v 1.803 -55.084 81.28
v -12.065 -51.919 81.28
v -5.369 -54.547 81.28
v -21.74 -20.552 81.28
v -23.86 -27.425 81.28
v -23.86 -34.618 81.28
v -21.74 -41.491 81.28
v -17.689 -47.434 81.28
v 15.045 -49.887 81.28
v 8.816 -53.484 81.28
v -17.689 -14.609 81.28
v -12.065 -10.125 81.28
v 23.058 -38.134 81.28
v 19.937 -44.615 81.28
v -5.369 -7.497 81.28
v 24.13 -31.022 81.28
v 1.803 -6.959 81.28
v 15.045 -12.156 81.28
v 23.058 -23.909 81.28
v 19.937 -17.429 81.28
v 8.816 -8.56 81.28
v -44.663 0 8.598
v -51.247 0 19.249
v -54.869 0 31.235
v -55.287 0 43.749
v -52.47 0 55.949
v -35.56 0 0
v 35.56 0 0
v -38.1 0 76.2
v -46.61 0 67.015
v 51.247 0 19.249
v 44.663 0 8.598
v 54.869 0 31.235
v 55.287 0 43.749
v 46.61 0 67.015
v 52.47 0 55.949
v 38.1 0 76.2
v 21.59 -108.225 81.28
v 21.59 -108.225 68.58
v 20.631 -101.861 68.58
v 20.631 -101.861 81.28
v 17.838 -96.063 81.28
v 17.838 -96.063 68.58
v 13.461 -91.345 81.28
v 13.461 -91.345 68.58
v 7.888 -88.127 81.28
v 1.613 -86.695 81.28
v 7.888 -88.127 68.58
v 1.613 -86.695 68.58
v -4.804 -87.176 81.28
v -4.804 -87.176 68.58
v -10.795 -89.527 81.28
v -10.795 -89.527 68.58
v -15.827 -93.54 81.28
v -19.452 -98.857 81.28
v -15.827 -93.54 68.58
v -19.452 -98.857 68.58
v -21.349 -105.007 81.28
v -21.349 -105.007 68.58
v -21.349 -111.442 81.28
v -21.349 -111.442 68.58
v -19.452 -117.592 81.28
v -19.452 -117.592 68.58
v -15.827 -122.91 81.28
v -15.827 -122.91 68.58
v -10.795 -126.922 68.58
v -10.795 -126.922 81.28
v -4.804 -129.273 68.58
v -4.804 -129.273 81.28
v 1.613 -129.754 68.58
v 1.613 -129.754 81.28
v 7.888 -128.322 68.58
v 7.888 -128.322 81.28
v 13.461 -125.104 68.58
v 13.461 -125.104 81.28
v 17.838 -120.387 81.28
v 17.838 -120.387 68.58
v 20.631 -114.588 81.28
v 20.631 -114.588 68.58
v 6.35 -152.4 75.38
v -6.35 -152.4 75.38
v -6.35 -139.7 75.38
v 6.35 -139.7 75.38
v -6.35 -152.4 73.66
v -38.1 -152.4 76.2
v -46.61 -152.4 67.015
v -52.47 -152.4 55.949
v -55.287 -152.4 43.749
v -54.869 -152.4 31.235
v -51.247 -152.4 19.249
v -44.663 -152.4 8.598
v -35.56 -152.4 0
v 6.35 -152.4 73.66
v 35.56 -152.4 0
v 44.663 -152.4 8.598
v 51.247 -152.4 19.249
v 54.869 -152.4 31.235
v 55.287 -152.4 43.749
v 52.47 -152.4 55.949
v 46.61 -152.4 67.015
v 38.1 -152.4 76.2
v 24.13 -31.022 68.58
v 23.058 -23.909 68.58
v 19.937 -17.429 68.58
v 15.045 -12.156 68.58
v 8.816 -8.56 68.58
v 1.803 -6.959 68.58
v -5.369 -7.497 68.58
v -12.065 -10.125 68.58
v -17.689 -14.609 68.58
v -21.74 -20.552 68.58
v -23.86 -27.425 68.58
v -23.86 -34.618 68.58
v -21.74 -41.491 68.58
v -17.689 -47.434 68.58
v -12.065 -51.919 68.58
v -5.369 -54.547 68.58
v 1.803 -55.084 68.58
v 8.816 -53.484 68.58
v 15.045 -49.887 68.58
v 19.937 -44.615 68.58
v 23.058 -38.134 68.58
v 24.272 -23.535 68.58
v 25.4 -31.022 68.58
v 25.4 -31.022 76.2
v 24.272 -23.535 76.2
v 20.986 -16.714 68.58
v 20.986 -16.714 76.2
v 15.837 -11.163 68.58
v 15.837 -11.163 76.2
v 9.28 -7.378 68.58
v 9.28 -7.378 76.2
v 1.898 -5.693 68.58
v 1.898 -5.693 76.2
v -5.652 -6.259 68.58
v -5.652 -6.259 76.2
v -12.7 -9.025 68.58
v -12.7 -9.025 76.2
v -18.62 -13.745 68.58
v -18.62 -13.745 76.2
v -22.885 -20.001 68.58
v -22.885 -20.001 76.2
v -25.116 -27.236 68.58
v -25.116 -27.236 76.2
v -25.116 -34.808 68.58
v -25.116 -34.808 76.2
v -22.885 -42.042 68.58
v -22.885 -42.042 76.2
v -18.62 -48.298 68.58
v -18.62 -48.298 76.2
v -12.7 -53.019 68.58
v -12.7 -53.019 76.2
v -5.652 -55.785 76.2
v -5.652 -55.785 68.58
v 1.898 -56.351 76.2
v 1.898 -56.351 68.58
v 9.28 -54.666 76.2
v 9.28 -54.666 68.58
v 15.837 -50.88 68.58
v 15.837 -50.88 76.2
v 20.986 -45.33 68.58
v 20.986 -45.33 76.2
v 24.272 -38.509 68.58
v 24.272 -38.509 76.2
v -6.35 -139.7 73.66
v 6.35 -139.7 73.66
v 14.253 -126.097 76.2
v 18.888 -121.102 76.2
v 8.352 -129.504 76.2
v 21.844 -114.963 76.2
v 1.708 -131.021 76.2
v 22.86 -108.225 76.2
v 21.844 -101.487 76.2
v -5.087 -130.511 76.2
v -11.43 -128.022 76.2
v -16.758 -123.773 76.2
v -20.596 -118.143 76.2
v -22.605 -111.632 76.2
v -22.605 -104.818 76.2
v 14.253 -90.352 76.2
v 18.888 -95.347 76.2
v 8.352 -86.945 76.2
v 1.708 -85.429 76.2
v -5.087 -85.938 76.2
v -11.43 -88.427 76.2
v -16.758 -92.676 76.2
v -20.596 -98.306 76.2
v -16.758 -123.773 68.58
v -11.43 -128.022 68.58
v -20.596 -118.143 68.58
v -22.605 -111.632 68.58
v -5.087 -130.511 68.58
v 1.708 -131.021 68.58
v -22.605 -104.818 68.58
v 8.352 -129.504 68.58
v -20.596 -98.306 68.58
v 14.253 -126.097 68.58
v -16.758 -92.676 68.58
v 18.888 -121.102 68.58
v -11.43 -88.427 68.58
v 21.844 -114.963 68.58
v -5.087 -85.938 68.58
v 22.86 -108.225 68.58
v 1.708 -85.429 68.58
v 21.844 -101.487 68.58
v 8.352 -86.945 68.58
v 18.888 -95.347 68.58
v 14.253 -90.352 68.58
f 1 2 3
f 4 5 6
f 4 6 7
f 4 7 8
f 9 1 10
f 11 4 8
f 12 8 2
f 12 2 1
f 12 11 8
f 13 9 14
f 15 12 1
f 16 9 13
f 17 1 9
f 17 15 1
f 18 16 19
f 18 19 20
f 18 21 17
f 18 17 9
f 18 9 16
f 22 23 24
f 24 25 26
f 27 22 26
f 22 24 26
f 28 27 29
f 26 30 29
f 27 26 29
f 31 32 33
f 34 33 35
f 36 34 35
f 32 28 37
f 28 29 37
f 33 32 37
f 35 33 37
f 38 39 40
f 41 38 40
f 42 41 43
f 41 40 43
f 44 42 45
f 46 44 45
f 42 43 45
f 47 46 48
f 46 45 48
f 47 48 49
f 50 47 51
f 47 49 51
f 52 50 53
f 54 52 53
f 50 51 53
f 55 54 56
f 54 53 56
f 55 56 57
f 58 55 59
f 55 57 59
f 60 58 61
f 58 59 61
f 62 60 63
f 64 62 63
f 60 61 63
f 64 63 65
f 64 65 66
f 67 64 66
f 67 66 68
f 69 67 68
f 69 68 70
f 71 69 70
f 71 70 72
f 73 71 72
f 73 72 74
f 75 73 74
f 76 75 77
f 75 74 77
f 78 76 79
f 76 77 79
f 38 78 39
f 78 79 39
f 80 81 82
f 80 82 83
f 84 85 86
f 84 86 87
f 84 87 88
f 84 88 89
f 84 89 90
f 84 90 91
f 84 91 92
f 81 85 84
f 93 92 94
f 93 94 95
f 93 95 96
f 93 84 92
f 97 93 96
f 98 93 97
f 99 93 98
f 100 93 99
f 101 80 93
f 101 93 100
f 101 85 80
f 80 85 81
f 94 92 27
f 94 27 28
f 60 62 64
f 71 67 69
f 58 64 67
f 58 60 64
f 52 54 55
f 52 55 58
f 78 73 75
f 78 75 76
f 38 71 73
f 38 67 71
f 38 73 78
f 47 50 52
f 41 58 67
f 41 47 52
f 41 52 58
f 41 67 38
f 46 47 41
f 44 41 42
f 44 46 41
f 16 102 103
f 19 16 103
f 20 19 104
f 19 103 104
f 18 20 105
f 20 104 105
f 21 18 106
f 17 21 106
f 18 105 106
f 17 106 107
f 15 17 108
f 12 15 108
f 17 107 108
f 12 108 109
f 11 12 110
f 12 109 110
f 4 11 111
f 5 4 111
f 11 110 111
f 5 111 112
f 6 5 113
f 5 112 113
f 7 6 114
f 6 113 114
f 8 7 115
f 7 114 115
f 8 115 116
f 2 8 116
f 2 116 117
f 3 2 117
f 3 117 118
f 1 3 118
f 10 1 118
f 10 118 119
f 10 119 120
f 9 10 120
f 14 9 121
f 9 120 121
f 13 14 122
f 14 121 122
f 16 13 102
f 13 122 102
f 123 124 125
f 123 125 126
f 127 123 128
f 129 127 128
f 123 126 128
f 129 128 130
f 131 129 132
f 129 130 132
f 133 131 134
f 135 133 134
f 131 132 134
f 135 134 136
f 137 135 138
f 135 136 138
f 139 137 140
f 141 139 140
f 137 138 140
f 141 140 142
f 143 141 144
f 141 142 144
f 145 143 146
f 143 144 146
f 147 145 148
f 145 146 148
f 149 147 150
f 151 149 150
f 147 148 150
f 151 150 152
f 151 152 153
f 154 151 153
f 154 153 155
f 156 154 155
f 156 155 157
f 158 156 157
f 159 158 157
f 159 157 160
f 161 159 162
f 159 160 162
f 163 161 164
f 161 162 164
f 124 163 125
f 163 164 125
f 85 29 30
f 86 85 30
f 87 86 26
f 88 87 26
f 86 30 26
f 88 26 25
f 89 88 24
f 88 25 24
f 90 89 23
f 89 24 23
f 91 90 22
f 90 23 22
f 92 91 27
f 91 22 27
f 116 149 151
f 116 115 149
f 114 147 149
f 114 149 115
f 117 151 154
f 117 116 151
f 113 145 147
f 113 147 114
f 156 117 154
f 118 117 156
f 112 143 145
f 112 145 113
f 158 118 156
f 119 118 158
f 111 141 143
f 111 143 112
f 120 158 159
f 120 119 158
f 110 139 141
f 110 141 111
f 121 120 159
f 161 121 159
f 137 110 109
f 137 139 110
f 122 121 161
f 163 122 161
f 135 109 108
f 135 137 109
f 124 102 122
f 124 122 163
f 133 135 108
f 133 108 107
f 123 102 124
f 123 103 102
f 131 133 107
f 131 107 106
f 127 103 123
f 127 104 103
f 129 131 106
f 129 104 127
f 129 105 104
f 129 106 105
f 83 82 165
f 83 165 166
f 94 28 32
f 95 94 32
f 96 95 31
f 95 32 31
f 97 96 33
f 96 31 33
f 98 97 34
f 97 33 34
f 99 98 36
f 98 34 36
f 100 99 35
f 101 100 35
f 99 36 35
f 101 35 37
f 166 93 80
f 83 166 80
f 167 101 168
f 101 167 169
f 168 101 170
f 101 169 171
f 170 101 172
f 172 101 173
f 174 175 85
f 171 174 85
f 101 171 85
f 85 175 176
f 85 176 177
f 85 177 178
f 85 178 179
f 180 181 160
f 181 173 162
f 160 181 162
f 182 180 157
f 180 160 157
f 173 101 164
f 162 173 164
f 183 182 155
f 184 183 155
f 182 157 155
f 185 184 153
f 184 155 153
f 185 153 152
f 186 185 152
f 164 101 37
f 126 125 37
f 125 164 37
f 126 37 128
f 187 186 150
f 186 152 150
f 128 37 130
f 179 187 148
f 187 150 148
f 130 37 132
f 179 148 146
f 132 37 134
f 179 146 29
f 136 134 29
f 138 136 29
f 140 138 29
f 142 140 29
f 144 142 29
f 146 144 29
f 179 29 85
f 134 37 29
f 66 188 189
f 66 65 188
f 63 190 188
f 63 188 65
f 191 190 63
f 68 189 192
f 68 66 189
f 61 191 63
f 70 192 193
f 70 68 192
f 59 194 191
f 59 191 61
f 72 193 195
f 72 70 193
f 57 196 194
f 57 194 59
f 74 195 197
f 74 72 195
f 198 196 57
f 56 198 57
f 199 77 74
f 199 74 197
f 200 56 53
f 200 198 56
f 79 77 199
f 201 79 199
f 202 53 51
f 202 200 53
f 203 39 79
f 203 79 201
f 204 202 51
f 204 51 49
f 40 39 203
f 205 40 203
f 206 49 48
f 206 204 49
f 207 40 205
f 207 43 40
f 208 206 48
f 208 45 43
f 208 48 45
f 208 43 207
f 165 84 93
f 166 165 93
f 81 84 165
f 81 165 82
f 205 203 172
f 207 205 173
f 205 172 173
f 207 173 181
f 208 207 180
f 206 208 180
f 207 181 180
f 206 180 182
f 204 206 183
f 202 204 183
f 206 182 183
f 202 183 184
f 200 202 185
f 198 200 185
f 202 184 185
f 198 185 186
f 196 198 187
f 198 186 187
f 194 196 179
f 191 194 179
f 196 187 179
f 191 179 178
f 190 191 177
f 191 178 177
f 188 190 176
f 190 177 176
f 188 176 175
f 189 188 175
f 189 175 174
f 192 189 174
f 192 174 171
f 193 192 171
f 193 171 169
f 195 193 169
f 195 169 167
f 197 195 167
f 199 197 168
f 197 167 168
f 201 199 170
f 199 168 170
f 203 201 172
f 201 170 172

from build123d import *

# Parameters (mm, degrees)
F1_DEPTH  = 152.4
F2_R      = 35.861849
F2_R_2    = 34.861464
F3_DEPTH  = 7.62
F4_R      = 25.4
F5_DEPTH  = 7.62
F6_R      = 24.13
F7_DEPTH  = 12.7
F8_R      = 22.86
F9_DEPTH  = 7.62
F10_R     = 21.59
F11_DEPTH = 12.7
F12_W     = 12.7
F12_H     = 1.719565
F13_DEPTH = 12.7


with BuildPart() as f1:
    # F0 (on Front) → F1 (new body)
    with BuildSketch(Plane.XZ):
        with BuildLine():
            Line((-35.56, 0), (0, 0))
            Line((0, 0), (0, 76.2))
            Line((0, 76.2), (-38.1, 76.2))
            ThreePointArc((-38.1, 76.2), (-55.485641, 37.478145), (-35.56, 0))
        make_face()
        with BuildLine():
            Line((0, 76.2), (0, 0))
            Line((0, 0), (35.56, 0))
            ThreePointArc((35.56, 0), (55.485641, 37.478145), (38.1, 76.2))
            Line((38.1, 76.2), (0, 76.2))
        make_face()
    extrude(amount=F1_DEPTH)

    # F2 (on face) → F3 (cut)
    with BuildSketch(Plane.XY.offset(76.2)):
        with Locations((0, -520.644426)):
            Circle(F2_R)
        with Locations((0, -297.697842)):
            Circle(F2_R_2)
    extrude(amount=-F3_DEPTH, mode=Mode.SUBTRACT)

    # F4 (on face) → F5 (cut)
    with BuildSketch(Plane.XY.offset(76.2)):
        with Locations((0, -31.021852)):
            Circle(F4_R)
    extrude(amount=-F5_DEPTH, mode=Mode.SUBTRACT)

    # F6 (on face) → F7 (join)
    with BuildSketch(Plane.XY.offset(68.58)):
        with Locations((0, -31.021852)):
            Circle(F6_R)
    extrude(amount=F7_DEPTH)

    # F8 (on face) → F9 (cut)
    with BuildSketch(Plane.XY.offset(76.2)):
        with Locations((0, -108.224646)):
            Circle(F8_R)
    extrude(amount=-F9_DEPTH, mode=Mode.SUBTRACT)

    # F10 (on face) → F11 (join)
    with BuildSketch(Plane.XY.offset(68.58)):
        with Locations((0, -108.224646)):
            Circle(F10_R)
    extrude(amount=F11_DEPTH)

    # F12 (on face) → F13 (cut)
    with BuildSketch(Plane.XZ.offset(152.4)):
        with Locations((0, 74.519782)):
            Rectangle(F12_W, F12_H)
    extrude(amount=-F13_DEPTH, mode=Mode.SUBTRACT)


solid = f1.part
